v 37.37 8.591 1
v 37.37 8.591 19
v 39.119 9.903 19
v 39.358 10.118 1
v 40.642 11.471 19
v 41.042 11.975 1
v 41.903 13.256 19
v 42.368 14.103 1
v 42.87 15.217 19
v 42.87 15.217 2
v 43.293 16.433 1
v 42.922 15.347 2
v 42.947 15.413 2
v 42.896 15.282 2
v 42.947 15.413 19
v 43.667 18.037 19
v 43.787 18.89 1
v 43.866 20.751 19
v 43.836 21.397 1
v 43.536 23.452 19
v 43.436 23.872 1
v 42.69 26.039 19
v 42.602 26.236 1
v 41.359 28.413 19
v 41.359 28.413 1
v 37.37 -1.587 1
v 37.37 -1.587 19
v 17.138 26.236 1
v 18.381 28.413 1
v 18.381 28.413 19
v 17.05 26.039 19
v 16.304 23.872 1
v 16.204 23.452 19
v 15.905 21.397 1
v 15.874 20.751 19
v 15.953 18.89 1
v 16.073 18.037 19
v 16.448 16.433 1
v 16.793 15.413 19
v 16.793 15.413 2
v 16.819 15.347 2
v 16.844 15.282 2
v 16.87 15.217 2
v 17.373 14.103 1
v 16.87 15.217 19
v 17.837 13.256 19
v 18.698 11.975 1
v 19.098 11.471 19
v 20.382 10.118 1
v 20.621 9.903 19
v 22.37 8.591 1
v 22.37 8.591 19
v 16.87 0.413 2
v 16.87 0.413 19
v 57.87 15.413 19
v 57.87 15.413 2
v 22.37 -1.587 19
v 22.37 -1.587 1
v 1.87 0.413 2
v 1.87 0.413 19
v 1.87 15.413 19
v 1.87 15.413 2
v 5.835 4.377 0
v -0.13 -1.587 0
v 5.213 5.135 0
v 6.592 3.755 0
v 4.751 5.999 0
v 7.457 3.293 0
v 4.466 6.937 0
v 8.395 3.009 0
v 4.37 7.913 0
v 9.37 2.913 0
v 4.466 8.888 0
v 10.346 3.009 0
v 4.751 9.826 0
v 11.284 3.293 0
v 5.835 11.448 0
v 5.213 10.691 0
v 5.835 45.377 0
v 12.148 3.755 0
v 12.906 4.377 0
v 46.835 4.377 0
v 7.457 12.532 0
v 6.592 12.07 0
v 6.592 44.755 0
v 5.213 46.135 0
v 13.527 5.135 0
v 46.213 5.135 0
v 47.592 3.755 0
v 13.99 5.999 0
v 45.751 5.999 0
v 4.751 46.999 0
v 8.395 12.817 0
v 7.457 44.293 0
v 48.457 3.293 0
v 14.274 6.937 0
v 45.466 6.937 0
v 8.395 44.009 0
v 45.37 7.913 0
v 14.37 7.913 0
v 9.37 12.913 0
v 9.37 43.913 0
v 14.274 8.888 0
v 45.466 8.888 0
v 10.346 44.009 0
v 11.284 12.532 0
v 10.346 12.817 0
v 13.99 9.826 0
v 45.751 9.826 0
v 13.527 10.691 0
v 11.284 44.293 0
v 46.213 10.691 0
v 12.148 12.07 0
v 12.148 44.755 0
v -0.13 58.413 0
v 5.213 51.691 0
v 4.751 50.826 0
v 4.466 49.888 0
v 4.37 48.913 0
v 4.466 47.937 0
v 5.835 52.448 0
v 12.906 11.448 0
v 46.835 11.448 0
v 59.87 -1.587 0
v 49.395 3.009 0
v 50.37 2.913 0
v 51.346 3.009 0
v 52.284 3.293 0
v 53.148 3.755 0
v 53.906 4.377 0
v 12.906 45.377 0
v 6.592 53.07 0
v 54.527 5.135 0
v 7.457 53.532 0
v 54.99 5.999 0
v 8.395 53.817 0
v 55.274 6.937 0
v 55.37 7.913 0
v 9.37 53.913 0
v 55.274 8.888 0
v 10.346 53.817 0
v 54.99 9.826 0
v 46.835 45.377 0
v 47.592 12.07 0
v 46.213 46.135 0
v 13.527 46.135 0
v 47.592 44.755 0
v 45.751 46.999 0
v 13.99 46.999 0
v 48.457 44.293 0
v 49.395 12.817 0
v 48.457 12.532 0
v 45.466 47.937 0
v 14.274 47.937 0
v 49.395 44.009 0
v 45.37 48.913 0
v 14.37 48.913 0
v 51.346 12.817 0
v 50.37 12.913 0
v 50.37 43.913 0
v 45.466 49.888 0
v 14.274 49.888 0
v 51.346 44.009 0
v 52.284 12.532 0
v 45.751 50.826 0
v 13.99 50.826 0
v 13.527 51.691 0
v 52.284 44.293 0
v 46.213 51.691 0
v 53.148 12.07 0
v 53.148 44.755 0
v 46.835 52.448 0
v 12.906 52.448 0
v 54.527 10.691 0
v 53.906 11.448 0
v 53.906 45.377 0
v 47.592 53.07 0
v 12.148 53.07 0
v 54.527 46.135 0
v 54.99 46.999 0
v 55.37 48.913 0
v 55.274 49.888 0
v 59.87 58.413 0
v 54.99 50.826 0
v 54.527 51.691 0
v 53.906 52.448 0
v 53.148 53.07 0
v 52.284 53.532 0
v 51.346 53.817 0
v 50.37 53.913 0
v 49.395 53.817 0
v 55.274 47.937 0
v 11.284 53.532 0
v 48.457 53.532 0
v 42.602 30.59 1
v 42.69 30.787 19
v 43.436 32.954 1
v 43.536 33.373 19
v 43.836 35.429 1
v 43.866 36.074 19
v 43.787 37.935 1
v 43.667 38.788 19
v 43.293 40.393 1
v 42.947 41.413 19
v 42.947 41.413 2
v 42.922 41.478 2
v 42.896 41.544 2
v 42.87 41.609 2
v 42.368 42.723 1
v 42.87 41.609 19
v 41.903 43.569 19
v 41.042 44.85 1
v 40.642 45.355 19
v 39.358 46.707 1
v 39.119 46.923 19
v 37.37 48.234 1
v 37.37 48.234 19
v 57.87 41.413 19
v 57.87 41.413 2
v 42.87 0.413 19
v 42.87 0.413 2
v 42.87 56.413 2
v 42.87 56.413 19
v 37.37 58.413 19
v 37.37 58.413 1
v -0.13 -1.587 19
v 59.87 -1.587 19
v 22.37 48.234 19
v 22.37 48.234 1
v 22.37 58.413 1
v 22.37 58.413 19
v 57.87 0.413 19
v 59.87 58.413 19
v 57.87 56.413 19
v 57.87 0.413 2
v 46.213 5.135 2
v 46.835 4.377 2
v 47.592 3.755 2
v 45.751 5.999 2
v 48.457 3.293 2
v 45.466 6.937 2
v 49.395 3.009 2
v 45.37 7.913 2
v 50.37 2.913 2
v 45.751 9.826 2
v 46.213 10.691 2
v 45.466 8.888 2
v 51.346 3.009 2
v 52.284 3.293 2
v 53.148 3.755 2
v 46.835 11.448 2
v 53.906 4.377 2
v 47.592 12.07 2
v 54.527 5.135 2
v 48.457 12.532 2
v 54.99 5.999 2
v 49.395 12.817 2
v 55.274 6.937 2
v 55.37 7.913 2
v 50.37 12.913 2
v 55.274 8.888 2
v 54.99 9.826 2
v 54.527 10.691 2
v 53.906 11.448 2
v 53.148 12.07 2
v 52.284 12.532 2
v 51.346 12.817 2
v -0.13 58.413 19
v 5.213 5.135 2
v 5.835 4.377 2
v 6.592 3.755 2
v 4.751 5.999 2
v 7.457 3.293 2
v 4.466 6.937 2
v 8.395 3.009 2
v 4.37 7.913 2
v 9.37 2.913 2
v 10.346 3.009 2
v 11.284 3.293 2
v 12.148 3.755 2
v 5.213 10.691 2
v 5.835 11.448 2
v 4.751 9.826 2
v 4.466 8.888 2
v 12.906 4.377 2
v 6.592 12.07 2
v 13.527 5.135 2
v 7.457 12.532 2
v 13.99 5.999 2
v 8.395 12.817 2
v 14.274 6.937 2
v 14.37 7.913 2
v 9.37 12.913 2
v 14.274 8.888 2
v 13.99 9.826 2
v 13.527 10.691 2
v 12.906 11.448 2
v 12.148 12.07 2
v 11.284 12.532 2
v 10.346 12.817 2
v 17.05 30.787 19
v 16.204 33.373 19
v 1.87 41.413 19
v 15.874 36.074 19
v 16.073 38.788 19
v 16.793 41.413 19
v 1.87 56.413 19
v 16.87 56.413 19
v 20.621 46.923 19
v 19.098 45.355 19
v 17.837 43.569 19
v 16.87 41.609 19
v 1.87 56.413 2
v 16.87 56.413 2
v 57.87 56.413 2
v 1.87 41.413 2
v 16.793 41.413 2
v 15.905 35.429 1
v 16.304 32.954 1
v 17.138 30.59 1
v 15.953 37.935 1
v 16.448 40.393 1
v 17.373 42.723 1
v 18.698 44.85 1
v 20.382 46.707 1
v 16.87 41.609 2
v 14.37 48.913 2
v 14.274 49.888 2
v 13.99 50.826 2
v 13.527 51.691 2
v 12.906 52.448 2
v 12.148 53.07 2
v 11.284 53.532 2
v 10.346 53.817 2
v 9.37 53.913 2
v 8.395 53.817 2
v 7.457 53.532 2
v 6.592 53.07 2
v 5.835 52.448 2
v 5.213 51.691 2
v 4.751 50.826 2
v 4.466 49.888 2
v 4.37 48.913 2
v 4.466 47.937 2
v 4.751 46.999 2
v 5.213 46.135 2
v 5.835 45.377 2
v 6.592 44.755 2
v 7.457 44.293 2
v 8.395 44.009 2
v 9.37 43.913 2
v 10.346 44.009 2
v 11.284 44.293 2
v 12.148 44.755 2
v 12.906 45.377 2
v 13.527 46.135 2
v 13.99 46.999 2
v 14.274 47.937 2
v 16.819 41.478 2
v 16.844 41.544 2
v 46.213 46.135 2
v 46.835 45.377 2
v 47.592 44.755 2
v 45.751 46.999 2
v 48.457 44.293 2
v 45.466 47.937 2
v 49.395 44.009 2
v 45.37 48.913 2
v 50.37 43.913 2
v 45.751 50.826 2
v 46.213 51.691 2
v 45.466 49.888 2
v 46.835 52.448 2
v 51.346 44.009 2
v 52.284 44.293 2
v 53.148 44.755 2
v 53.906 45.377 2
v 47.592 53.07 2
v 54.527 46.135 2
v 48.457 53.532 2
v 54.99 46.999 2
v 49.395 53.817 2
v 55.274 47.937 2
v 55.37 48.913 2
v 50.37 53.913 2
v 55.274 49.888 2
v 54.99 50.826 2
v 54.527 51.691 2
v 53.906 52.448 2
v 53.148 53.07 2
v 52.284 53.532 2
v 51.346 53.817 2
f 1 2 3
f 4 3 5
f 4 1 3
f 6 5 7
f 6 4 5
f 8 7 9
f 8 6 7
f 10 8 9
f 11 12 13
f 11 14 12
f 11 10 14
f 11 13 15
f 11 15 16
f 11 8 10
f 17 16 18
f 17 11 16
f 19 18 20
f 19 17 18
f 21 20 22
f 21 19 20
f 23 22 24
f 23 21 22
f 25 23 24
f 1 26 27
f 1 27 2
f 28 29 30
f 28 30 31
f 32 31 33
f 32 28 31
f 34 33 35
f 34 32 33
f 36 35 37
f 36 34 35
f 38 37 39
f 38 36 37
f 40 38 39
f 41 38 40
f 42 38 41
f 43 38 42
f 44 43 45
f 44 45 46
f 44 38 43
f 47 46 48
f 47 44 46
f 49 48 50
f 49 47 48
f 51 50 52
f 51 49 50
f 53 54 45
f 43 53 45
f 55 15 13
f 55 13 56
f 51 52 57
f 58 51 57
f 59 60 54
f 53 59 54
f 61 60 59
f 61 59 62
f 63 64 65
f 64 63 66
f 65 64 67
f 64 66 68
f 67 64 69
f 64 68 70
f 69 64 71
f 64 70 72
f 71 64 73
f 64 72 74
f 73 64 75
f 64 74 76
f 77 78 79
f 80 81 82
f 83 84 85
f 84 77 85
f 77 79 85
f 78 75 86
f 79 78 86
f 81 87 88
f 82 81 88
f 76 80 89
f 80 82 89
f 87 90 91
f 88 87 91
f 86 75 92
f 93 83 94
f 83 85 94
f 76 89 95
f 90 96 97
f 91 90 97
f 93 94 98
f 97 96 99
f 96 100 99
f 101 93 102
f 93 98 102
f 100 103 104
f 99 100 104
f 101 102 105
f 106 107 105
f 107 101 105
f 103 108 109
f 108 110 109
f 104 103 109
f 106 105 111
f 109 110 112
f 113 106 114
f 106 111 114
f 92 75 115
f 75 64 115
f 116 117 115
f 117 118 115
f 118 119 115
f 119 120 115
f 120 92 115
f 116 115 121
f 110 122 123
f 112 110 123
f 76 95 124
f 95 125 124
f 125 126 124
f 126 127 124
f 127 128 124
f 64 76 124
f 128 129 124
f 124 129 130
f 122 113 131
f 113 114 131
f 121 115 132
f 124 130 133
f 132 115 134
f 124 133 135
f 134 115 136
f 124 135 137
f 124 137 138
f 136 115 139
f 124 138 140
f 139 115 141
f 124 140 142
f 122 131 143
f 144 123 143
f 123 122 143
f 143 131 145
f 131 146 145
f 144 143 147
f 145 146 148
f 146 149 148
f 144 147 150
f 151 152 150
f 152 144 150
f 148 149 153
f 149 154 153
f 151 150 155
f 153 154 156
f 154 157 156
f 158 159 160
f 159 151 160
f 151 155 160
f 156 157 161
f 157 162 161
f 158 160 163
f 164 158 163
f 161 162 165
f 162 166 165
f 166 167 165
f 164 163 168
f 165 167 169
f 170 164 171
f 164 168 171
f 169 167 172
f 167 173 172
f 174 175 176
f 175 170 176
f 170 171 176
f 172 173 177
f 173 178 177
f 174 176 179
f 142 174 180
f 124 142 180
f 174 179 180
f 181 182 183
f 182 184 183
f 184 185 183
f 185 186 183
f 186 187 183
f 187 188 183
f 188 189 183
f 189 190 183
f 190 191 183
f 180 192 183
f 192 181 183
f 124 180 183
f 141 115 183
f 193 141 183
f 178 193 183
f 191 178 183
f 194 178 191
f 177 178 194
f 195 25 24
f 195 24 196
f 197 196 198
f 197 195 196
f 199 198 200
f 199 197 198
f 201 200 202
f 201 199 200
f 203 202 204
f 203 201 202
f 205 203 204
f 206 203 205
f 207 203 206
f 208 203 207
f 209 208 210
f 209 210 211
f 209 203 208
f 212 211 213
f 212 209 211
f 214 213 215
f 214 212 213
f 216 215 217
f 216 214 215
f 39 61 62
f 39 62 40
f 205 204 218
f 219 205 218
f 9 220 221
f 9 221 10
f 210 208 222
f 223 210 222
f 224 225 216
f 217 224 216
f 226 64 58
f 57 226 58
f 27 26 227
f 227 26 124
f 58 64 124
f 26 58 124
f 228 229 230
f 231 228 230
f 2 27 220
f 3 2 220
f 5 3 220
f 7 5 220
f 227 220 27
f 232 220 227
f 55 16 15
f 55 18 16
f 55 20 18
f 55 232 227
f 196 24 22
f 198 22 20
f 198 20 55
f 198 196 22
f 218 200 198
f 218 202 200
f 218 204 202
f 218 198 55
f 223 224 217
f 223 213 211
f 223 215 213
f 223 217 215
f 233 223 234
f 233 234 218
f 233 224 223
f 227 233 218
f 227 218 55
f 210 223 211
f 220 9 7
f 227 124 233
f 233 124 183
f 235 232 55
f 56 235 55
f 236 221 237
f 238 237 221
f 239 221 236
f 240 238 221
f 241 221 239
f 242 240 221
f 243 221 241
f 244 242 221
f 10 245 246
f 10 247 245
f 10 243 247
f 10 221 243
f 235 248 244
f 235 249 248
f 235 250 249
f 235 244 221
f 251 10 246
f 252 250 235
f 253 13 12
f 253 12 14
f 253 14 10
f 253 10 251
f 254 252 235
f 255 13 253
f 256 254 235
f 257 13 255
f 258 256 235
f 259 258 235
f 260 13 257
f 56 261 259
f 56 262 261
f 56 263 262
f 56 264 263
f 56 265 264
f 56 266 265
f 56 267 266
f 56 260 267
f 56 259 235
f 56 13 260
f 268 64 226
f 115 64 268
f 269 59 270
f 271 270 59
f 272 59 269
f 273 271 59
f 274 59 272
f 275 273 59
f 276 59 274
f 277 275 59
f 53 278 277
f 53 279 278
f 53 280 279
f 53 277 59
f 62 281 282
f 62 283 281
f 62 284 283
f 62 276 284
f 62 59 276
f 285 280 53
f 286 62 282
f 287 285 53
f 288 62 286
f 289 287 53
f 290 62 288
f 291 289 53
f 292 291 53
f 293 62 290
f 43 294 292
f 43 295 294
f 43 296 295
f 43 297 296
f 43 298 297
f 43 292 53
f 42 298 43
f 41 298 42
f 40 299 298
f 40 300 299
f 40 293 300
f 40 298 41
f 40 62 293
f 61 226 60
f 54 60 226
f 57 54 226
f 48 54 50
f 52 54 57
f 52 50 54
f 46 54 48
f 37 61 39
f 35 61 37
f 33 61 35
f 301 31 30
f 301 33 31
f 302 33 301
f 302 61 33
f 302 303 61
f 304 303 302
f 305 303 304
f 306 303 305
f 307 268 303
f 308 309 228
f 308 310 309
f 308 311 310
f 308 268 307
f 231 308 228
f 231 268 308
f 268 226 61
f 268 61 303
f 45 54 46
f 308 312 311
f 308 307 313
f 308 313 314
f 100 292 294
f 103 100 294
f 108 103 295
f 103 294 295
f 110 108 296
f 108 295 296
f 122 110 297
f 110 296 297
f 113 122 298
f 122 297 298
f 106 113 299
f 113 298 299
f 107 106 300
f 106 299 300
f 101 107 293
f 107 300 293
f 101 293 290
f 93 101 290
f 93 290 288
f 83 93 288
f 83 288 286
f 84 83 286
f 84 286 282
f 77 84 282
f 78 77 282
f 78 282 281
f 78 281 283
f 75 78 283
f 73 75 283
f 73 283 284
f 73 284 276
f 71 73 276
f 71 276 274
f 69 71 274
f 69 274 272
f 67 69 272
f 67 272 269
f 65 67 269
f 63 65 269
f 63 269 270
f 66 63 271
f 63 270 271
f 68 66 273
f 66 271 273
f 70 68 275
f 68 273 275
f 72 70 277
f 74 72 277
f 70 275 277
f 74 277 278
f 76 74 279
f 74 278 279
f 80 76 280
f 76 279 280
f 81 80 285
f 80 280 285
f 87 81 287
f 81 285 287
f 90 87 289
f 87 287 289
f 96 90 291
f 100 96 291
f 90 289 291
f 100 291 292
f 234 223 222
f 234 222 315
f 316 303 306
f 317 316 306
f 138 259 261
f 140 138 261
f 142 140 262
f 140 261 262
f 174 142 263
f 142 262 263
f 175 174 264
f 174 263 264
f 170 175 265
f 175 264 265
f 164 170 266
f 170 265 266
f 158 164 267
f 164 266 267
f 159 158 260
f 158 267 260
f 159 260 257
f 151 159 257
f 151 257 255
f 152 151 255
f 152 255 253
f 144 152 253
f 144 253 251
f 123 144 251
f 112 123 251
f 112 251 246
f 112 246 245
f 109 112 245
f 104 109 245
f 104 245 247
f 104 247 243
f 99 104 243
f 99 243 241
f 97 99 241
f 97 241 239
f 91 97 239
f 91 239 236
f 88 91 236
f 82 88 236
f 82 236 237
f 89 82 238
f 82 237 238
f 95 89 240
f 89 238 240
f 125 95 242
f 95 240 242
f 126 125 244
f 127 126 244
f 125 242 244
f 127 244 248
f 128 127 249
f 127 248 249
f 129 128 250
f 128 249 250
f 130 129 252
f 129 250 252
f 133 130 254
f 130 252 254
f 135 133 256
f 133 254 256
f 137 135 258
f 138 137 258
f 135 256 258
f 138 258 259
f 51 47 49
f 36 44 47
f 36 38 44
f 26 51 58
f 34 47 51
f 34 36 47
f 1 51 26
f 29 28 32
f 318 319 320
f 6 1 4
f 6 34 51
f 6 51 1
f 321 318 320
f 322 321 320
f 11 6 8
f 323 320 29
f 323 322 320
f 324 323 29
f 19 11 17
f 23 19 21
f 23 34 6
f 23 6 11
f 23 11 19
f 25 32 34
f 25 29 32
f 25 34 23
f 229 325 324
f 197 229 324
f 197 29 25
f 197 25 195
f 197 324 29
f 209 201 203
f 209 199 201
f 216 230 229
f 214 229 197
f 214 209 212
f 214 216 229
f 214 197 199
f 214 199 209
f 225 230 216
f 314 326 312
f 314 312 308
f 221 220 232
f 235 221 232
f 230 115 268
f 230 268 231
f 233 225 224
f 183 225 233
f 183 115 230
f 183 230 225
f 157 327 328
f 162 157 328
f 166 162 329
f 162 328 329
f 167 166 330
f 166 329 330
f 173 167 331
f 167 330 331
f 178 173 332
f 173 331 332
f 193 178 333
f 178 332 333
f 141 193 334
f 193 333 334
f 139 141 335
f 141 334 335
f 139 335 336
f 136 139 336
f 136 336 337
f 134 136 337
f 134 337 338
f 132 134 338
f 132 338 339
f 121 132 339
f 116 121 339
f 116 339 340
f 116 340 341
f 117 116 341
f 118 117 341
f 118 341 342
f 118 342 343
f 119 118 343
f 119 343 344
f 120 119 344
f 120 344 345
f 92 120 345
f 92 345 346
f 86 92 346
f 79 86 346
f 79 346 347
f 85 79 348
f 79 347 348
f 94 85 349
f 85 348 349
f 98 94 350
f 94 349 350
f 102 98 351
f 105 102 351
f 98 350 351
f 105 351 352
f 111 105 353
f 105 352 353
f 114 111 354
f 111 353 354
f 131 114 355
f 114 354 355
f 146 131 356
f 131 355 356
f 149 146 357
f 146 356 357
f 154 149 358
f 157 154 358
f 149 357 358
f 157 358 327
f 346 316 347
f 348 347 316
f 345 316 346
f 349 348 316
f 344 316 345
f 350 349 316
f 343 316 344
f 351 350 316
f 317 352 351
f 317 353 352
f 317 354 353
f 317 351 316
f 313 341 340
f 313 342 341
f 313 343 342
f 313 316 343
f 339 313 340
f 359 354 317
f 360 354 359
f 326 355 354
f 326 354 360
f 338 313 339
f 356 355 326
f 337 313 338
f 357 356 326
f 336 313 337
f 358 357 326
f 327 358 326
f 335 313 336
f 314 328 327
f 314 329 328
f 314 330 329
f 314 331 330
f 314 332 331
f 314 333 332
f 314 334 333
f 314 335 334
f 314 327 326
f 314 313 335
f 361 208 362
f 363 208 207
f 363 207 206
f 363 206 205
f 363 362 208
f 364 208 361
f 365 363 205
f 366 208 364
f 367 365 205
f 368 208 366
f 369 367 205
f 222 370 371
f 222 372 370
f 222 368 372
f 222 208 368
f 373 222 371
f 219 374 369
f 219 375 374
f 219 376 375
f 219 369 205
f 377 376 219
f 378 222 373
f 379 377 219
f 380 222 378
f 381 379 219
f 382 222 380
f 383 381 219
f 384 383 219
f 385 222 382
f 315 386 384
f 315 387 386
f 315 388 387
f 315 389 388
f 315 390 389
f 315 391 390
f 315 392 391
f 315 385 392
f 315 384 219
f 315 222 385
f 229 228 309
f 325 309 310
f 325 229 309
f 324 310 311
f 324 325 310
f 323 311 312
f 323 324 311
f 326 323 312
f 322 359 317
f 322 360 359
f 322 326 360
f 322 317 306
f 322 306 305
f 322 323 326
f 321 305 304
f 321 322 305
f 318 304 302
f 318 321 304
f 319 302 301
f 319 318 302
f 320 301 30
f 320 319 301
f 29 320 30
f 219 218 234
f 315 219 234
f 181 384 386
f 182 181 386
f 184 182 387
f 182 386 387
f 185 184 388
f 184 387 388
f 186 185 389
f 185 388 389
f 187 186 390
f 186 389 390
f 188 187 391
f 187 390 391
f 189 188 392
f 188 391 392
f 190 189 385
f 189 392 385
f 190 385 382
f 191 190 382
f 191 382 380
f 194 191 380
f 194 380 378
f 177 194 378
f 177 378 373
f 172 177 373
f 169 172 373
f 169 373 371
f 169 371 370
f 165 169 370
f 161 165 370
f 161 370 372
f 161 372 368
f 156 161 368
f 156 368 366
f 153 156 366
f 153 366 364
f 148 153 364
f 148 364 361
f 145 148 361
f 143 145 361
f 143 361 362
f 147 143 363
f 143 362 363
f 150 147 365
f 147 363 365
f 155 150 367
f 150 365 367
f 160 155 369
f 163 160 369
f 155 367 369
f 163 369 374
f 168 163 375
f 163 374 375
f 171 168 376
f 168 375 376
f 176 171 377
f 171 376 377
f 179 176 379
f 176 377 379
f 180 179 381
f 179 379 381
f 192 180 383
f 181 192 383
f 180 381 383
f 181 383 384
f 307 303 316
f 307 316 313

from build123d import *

# Parameters (mm, degrees)
ESBO_O1_W                = 60
ESBO_O1_H                = 60
RESSALTO_EXTRUS_O2_DEPTH = 1
ESBO_O10_W               = 60
ESBO_O10_H               = 60
RESSALTO_EXTRUS_O5_DEPTH = 19
ESBO_O13_W               = 15
ESBO_O13_H               = 15
CORTE_EXTRUS_O7_DEPTH    = 17
ESBO_O14_R               = 5
CORTE_EXTRUS_O8_DEPTH    = 86.775773693
CORTE_EXTRUS_O9_START    = -18
ESBO_O15_R               = 4.5
CORTE_EXTRUS_O9_DEPTH    = 18


with BuildPart() as part:
    # Esboço1 → Ressalto-extrusão2 (new body)
    with BuildSketch(Plane.XY):
        with Locations((29.870134555, 28.412758376)):
            Rectangle(ESBO_O1_W, ESBO_O1_H)
    extrude(amount=RESSALTO_EXTRUS_O2_DEPTH)

    # Esboço10 → Ressalto-extrusão5 (add)
    with BuildSketch(Plane.XY):
        with Locations((29.870134555, 28.412758376)):
            Rectangle(ESBO_O10_W, ESBO_O10_H)
        with BuildLine():
            ThreePointArc((18.381009261, 28.412758376), (29.870134555, 6.412758376), (41.359259848, 28.412758376))
            ThreePointArc((41.359259848, 28.412758376), (29.870134555, 50.412758376), (18.381009261, 28.412758376))
        make_face(mode=Mode.SUBTRACT)
    extrude(amount=RESSALTO_EXTRUS_O5_DEPTH)

    # Esboço13 → Corte-extrusão7 (cut)
    with BuildSketch(Plane.XY.offset(19)):
        with Locations((9.370134555, 48.912758376)):
            Rectangle(ESBO_O13_W, ESBO_O13_H)
        with Locations((50.370134555, 48.912758376)):
            Rectangle(ESBO_O13_W, ESBO_O13_H)
        with Locations((9.370134555, 7.912758376)):
            Rectangle(ESBO_O13_W, ESBO_O13_H)
        with Locations((50.370134555, 7.912758376)):
            Rectangle(ESBO_O13_W, ESBO_O13_H)
    extrude(amount=-CORTE_EXTRUS_O7_DEPTH, mode=Mode.SUBTRACT)

    # Esboço14 → Corte-extrusão8 (cut, through all)
    with BuildSketch(Plane.XY.offset(19)):
        with Locations((9.370134555, 48.912758376)):
            Circle(ESBO_O14_R)
        with Locations((9.370134555, 7.912758376)):
            Circle(ESBO_O14_R)
        with Locations((50.370134555, 7.912758376)):
            Circle(ESBO_O14_R)
        with Locations((50.370134555, 48.912758376)):
            Circle(ESBO_O14_R)
    extrude(amount=-CORTE_EXTRUS_O8_DEPTH, mode=Mode.SUBTRACT)

    # Esboço15 → Corte-extrusão9 (cut)
    with BuildSketch(Plane.XY.offset(19).offset(CORTE_EXTRUS_O9_START)):
        with Locations((29.870134555, 28.412758376)):
            Circle(ESBO_O15_R)
        with BuildLine():
            Line((22.370134555, 8.591167958), (22.370134555, -1.587241624))
            Line((22.370134555, -1.587241624), (37.370134555, -1.587241624))
            Line((37.370134555, -1.587241624), (37.370134555, 8.591167958))
            ThreePointArc((37.370134555, 8.591167958), (29.870134555, 6.412758376), (22.370134555, 8.591167958))
        make_face()
        with BuildLine():
            Line((22.370134555, 58.412758376), (37.370134555, 58.412758376))
            Line((37.370134555, 58.412758376), (37.370134555, 48.234348794))
            ThreePointArc((37.370134555, 48.234348794), (29.870134555, 50.412758376), (22.370134555, 48.234348794))
            Line((22.370134555, 48.234348794), (22.370134555, 58.412758376))
        make_face()
    extrude(amount=CORTE_EXTRUS_O9_DEPTH, mode=Mode.SUBTRACT)


solid = part.part
